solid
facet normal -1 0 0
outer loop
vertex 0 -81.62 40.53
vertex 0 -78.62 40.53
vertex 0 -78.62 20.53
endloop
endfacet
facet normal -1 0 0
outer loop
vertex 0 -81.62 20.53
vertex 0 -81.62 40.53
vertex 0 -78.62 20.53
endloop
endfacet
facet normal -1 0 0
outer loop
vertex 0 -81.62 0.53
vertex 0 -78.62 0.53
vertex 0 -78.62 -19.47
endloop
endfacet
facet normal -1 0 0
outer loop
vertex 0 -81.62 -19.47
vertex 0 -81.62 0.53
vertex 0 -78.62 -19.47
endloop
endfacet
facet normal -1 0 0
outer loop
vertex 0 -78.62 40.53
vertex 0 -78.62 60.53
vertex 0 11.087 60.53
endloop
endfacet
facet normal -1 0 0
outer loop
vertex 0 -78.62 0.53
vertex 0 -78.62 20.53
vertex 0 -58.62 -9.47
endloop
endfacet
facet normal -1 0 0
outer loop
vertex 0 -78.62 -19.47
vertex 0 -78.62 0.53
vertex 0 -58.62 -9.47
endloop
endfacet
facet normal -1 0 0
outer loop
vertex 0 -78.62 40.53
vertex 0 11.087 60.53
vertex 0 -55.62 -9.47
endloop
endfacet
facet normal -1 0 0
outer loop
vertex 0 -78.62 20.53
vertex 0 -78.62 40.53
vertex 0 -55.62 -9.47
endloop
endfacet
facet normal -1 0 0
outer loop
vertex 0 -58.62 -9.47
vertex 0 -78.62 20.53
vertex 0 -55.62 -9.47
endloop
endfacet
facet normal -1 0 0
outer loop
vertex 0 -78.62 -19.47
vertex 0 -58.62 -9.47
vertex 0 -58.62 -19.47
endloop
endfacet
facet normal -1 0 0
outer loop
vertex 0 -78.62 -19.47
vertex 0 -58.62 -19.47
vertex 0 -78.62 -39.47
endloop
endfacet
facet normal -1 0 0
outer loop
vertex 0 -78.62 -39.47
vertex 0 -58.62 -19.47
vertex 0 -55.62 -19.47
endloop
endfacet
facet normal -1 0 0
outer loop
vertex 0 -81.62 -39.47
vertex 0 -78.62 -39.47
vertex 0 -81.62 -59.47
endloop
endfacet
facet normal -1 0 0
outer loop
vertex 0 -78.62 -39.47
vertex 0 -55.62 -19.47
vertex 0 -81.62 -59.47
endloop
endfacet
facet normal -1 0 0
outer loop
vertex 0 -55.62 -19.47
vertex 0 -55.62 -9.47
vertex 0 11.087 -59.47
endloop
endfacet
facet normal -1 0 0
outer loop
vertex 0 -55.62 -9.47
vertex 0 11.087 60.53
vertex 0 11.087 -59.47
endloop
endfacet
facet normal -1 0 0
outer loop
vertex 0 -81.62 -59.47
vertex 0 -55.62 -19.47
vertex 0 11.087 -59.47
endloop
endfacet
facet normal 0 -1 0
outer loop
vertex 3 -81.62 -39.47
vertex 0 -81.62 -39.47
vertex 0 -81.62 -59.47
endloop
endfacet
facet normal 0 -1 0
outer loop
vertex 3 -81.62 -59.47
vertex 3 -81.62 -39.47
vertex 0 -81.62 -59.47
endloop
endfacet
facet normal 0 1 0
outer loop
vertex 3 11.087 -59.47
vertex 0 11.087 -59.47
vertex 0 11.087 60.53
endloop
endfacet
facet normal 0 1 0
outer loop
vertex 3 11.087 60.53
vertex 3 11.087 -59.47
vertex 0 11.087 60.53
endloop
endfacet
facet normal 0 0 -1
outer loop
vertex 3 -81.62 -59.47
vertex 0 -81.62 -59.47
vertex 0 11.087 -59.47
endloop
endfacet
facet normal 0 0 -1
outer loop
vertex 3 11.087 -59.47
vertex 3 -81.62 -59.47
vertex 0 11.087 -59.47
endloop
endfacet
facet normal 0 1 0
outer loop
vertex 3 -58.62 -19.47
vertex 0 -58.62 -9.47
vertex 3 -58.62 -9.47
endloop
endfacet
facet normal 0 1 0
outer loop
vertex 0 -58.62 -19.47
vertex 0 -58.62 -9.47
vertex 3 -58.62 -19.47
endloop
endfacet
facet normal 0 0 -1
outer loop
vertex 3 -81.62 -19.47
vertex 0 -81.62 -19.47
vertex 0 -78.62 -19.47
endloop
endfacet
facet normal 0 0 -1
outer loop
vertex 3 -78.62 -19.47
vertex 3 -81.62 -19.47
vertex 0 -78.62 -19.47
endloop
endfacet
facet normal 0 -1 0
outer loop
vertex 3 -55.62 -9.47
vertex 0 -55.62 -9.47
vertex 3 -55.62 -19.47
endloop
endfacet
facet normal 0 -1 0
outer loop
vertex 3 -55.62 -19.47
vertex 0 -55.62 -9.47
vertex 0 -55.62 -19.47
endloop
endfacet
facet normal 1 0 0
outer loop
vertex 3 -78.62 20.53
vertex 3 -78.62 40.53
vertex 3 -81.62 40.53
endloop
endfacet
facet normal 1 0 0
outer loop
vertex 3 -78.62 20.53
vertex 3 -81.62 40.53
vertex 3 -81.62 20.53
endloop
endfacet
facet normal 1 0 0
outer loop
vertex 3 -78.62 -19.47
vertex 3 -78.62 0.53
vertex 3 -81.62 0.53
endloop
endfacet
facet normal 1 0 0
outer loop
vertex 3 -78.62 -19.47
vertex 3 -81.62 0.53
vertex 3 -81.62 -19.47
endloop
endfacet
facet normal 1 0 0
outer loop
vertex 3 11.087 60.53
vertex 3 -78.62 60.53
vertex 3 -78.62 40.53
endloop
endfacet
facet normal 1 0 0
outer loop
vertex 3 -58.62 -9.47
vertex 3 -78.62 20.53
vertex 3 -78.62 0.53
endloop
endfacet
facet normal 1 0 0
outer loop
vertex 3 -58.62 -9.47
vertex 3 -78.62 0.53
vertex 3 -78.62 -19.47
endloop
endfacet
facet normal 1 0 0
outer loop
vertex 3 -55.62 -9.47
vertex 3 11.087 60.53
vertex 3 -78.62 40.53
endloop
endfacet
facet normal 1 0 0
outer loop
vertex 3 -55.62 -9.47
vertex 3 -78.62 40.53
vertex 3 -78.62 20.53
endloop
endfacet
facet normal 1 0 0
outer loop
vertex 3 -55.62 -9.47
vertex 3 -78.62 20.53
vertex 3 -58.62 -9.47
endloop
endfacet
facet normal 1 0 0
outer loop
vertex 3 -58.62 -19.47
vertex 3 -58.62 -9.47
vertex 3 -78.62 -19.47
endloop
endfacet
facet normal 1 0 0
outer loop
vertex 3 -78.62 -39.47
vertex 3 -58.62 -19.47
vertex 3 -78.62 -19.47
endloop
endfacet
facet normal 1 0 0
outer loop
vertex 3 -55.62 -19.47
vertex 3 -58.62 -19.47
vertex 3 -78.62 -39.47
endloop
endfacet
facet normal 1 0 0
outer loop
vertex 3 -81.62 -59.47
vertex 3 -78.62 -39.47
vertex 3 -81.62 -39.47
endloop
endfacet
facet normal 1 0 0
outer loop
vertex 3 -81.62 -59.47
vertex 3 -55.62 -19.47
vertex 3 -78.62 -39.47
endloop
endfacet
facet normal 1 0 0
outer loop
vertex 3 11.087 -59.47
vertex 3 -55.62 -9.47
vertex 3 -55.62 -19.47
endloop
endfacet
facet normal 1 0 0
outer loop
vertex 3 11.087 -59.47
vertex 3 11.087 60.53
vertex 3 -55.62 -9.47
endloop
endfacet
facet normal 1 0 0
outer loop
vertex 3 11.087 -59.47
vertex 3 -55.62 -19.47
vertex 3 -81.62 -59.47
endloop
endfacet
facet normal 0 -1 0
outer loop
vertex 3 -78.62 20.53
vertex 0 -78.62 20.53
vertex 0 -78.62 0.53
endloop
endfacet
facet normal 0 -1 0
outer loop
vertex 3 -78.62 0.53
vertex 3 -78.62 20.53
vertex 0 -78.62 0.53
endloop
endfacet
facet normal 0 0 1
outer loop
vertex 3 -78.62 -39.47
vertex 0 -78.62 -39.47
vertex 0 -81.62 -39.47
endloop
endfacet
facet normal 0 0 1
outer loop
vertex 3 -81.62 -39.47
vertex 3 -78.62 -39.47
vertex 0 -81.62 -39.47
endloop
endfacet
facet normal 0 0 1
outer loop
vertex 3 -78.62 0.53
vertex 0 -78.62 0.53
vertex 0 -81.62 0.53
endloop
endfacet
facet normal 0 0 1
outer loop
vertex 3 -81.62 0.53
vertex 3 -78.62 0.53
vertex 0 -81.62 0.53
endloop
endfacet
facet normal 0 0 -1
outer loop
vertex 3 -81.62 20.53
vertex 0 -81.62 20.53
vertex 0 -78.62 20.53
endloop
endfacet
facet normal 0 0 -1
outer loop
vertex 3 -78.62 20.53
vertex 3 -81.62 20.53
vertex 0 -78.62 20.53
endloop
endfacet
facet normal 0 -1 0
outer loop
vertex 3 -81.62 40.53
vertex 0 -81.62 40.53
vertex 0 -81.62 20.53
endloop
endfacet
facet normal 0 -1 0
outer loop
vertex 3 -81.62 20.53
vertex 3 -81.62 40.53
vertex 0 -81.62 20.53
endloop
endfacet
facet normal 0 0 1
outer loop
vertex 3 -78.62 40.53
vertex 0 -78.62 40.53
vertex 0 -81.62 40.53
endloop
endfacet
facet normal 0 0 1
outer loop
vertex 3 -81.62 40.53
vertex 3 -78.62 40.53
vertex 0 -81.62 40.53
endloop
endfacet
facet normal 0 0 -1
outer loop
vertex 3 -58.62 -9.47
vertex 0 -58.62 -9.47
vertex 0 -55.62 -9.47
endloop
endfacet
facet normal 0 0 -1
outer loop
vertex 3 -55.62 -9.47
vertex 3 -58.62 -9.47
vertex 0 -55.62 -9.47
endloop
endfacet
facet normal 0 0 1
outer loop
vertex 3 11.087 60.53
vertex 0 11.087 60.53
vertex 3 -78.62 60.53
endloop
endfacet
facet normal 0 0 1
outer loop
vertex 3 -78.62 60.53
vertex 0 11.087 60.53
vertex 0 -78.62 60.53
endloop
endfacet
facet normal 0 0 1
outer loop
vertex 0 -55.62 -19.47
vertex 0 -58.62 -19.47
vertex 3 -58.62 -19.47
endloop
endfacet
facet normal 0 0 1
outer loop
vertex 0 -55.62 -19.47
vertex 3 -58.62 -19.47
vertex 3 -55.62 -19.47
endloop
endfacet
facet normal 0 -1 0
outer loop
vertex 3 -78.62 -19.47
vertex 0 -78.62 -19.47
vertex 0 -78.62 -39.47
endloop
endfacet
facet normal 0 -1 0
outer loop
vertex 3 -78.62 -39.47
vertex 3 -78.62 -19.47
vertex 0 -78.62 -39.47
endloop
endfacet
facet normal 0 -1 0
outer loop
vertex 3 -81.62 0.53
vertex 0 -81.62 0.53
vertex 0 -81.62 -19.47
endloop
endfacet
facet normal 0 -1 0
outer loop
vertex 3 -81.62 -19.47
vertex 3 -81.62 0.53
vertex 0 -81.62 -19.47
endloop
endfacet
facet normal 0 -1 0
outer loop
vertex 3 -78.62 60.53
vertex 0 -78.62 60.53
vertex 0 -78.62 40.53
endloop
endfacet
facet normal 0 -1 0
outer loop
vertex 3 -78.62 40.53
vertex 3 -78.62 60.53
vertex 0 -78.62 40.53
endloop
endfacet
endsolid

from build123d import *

# Parameters (mm, degrees)
CROQUIS1_W              = 10
CROQUIS1_H              = 3
SALIENTE_EXTRUIR1_DEPTH = 3


with BuildPart() as part:
    # Croquis1 → Saliente-Extruir1 (new body)
    with BuildSketch(Plane(origin=(0, 0, 0), x_dir=(0, 0, -1), z_dir=(1, 0, 0))):
        Polygon((-60.530143817, -78.620199336), (-40.530143817, -78.620199336), (-40.530143817, -81.620199336), (-20.530143817, -81.620199336), (-20.530143817, -78.620199336), (-0.530143817, -78.620199336), (-0.530143817, -81.620199336), (19.469856183, -81.620199336), (19.469856183, -78.620199336), (39.469856183, -78.620199336), (39.469856183, -81.620199336), (59.469856183, -81.620199336), (59.469856183, 11.086867688), (-60.530143817, 11.086867688), align=None)
        with Locations((14.469856183, -57.120199336)):
            Rectangle(CROQUIS1_W, CROQUIS1_H, mode=Mode.SUBTRACT)
    extrude(amount=SALIENTE_EXTRUIR1_DEPTH)


solid = part.part
